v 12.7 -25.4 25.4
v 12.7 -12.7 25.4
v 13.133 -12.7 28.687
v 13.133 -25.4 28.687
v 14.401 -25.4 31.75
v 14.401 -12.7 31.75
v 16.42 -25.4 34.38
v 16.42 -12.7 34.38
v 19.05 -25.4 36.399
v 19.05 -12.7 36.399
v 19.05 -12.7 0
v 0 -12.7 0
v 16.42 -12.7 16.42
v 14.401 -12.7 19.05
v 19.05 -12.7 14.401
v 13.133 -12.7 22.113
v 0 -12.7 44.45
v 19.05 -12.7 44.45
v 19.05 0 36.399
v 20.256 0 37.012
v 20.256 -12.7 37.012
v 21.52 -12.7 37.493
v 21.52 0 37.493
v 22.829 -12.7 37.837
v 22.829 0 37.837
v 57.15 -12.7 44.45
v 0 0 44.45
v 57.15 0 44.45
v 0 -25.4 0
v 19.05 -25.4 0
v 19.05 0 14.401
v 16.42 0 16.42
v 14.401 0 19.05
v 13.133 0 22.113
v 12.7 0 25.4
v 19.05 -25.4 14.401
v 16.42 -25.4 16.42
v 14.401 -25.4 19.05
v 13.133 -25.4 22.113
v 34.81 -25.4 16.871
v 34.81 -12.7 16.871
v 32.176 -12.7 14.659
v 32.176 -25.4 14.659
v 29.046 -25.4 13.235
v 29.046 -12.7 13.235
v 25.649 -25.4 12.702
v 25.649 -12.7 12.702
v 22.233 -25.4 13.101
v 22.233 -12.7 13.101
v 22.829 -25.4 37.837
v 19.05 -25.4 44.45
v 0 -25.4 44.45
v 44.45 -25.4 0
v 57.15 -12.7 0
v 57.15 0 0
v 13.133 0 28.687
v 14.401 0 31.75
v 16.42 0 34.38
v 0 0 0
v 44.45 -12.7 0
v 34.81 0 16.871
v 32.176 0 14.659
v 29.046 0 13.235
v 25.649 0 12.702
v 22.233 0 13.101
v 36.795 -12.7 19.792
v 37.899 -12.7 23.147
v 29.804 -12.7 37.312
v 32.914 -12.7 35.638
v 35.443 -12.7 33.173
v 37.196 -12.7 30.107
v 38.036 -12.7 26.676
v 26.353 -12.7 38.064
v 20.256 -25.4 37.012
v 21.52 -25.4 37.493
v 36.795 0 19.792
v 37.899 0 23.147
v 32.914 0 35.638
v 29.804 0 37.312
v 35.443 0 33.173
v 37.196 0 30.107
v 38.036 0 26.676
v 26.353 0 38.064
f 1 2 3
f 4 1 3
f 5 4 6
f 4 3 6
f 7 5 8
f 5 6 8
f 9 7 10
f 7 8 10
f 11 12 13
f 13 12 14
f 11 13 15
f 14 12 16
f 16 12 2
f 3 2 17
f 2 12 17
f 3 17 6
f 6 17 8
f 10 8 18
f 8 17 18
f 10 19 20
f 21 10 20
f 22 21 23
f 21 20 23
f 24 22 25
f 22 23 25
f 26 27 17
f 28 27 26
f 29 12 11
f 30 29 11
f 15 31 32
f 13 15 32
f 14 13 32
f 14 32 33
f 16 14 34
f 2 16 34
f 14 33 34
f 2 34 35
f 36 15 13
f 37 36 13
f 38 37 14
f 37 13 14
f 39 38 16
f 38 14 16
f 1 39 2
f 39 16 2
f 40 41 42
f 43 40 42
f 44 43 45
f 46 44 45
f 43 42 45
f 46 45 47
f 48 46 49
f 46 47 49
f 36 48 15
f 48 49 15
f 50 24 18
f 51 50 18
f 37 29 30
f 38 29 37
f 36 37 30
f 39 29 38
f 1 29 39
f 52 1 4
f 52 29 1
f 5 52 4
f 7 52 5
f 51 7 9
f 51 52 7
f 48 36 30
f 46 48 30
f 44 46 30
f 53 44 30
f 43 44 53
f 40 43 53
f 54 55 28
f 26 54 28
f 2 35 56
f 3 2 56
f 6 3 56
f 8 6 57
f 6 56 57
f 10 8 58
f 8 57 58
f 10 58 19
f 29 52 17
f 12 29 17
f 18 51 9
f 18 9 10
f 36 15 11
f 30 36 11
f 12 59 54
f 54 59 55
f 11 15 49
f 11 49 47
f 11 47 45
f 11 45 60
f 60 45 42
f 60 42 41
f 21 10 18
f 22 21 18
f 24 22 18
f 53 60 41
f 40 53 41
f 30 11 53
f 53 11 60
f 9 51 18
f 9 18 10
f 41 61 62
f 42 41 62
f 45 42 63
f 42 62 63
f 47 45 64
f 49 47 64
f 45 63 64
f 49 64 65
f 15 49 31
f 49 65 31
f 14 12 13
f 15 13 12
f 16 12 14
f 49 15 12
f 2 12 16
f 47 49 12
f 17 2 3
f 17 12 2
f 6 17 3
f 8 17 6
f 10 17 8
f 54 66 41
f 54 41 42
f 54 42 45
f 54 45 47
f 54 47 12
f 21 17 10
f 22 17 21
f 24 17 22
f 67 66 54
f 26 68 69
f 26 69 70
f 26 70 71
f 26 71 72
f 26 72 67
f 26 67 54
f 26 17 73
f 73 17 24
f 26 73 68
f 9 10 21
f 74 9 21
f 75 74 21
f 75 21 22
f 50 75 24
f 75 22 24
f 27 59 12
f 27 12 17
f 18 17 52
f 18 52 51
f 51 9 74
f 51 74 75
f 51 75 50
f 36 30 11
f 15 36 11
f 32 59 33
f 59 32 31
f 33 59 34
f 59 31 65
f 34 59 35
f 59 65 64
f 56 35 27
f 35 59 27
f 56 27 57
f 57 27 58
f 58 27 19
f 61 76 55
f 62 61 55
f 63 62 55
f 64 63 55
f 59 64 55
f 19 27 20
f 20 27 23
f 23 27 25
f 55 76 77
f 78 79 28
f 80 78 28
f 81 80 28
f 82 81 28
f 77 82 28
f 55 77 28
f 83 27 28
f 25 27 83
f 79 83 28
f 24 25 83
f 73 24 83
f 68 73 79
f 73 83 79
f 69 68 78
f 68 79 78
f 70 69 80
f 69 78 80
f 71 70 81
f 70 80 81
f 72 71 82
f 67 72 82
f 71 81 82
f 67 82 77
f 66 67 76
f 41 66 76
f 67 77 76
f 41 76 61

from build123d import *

# Parameters (mm, degrees)
F0_W     = 57.15
F0_H     = 44.45
F1_DEPTH = 12.7
F2_W     = 19.05
F2_H     = 12.7
F3_DEPTH = 44.45
F5_DEPTH = 12.7
F7_DEPTH = 25.4


# Not quite as in the source:
# - a feature of the source that left no trace in its solid (it failed there, or was rolled back) is left out


with BuildPart() as f1:
    # F0 (on Front) → F1 (new body)
    with BuildSketch(Plane.XZ):
        with Locations((28.575, 22.225)):
            Rectangle(F0_W, F0_H)
    extrude(amount=F1_DEPTH)


with BuildPart() as f3:
    # F2 (on face) → F3 (new body)
    with BuildSketch(Plane.XY.offset(44.45)):
        with Locations((9.525, -19.05)):
            Rectangle(F2_W, F2_H)
    extrude(amount=-F3_DEPTH)


with BuildPart() as f5:
    # F4 (on face) → F5 (new body)
    with BuildSketch(Plane.XZ.offset(12.7)):
        Polygon((44.45, 0), (19.05, 44.45), (19.05, 0), align=None)
    extrude(amount=F5_DEPTH)


with BuildPart() as f7_tool:
    # F6 (on face) → F7 (new body)
    with BuildSketch(Plane(origin=(0, 0, 0), x_dir=(-1, 0, 0), z_dir=(0, 1, 0))):
        with BuildLine():
            ThreePointArc((-22.8288518953, 37.8370091832), (-36.426687905, 31.7009645171), (-34.8096096432, 16.8706831245))
            Line((-34.8096096432, 16.8706831245), (-22.8288518953, 37.8370091832))
        make_face()
        with BuildLine():
            Line((-22.8288518953, 37.8370091832), (-34.8096096432, 16.8706831245))
            ThreePointArc((-34.8096096432, 16.8706831245), (-27.3658451247, 12.8530699792), (-19.05, 14.4014773719))
            Line((-19.05, 14.4014773719), (-19.05, 36.3985226281))
            ThreePointArc((-19.05, 36.3985226281), (-20.8818110078, 37.2691182584), (-22.8288518953, 37.8370091832))
        make_face()
        with BuildLine():
            Line((-19.05, 36.3985226281), (-19.05, 14.4014773719))
            ThreePointArc((-19.05, 14.4014773719), (-14.4014773719, 19.05), (-12.7, 25.4))
            ThreePointArc((-12.7, 25.4), (-14.4014773719, 31.75), (-19.05, 36.3985226281))
        make_face()
    extrude(amount=-F7_DEPTH)


with BuildPart() as f1_1:
    add(f1.part)

    # F7: cut by f7_tool
    add(f7_tool.part, mode=Mode.SUBTRACT)


with BuildPart() as f3_1:
    add(f3.part)

    # F7: cut by f7_tool
    add(f7_tool.part, mode=Mode.SUBTRACT)


with BuildPart() as f5_1:
    add(f5.part)

    # F7: cut by f7_tool
    add(f7_tool.part, mode=Mode.SUBTRACT)


solid = Compound([f1_1.part, f3_1.part, f5_1.part])
